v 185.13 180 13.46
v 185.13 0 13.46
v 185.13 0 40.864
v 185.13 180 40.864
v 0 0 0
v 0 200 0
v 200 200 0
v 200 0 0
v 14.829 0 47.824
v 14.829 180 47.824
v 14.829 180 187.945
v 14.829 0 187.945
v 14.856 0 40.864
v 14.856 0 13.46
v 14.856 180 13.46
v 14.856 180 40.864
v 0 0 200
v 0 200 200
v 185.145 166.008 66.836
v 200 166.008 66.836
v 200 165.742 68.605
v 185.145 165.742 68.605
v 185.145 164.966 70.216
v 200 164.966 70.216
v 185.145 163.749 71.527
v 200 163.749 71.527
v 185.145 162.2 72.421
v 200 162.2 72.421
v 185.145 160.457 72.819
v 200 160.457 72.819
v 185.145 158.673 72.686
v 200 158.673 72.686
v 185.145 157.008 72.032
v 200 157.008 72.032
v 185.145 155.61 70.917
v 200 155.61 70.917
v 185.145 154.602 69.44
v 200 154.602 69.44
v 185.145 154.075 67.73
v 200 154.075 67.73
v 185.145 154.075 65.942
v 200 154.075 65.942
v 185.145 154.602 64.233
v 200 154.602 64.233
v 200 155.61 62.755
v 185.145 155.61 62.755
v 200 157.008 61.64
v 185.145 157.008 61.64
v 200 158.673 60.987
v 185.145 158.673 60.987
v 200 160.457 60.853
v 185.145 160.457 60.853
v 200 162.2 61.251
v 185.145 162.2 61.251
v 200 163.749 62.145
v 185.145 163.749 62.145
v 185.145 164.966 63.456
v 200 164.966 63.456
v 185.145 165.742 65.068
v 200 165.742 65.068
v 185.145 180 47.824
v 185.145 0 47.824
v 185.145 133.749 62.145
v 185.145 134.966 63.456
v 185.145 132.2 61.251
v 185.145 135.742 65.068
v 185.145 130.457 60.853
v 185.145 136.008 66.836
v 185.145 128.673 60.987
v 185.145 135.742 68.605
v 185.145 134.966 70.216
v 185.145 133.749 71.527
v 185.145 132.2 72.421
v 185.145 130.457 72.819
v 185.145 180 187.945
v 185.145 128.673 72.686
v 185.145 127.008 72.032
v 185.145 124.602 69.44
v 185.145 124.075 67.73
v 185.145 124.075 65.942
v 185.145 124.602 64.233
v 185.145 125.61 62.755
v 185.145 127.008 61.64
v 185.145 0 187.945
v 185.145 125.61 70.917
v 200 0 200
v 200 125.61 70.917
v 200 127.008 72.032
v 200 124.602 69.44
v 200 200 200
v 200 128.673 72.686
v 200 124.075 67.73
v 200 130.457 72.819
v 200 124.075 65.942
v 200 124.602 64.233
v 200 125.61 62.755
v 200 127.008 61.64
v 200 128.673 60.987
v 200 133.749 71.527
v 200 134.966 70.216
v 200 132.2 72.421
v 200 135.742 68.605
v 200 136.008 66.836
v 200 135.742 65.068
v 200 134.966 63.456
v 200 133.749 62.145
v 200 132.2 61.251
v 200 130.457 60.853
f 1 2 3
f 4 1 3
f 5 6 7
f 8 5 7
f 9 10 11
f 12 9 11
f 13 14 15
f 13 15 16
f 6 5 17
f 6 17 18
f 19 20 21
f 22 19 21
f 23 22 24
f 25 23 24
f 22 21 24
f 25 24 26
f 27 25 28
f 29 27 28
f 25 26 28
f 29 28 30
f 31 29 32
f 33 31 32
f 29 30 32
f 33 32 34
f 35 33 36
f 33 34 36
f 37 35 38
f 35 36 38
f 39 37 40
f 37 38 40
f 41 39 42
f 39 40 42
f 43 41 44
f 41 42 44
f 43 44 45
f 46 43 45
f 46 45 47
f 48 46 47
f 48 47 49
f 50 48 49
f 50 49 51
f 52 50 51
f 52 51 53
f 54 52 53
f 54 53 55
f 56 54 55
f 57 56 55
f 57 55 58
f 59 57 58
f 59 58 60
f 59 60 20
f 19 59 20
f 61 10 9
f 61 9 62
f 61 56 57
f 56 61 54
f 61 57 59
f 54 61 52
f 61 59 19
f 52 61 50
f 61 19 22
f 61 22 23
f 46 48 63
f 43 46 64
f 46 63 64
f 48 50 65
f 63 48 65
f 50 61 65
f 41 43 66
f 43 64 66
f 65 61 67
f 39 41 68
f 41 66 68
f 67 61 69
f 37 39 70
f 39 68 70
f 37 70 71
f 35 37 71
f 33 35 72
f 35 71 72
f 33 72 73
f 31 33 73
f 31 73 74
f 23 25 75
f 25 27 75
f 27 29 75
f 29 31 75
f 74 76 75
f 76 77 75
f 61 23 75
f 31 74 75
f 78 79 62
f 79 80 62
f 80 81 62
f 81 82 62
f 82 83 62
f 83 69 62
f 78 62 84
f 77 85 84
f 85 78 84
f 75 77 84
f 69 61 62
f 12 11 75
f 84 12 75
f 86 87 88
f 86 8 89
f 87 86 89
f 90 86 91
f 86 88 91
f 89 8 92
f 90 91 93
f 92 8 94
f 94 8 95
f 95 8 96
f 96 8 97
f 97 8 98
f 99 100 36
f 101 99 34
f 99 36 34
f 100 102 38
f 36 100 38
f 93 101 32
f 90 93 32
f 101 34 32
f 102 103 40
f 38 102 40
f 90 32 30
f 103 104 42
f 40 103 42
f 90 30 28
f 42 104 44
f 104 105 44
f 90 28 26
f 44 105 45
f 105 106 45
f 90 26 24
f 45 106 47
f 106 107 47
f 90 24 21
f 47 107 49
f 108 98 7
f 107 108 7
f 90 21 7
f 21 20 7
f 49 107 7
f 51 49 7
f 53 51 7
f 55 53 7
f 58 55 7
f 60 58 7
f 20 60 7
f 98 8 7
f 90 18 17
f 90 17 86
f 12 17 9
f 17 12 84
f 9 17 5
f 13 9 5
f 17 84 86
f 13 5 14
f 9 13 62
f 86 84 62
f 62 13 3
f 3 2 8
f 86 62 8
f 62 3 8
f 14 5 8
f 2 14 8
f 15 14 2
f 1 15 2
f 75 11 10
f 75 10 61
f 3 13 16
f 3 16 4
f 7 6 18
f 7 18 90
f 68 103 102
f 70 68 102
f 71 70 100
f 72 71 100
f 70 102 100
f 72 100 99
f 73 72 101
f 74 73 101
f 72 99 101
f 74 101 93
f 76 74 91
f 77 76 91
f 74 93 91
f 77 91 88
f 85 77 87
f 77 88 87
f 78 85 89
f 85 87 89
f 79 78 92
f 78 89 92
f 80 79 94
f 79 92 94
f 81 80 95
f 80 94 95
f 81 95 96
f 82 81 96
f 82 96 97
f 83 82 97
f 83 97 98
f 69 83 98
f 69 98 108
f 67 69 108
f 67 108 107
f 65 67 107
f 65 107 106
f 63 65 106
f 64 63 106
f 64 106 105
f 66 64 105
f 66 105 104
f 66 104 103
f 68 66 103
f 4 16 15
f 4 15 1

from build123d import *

# Parameters (mm, degrees)
BOX_W           = 200
BOX_H           = 200
BOX_DEPTH       = 200
SKETCH_W        = 170.31563
SKETCH_H        = 140.120693
SKETCH_W_2      = 170.274007
SKETCH_H_2      = 27.404772
POCKET_DEPTH    = 180
SKETCH001_R     = 6
POCKET004_DEPTH = 20


with BuildPart() as part:
    # Box → Box (new body)
    with BuildSketch(Plane.XY):
        with Locations((100, 100)):
            Rectangle(BOX_W, BOX_H)
    extrude(amount=BOX_DEPTH)

    # Sketch → Pocket (cut)
    with BuildSketch(Plane.XZ):
        with Locations((99.987303, 117.884569)):
            Rectangle(SKETCH_W, SKETCH_H)
        with Locations((99.992803, 27.16207)):
            Rectangle(SKETCH_W_2, SKETCH_H_2)
    extrude(amount=-POCKET_DEPTH, mode=Mode.SUBTRACT)

    # Sketch001 → Pocket004 (cut)
    with BuildSketch(Plane.YZ.offset(200)):
        with Locations((130.008312, 66.836238)):
            Circle(SKETCH001_R)
        with Locations((160.008312, 66.836238)):
            Circle(SKETCH001_R)
    extrude(amount=-POCKET004_DEPTH, mode=Mode.SUBTRACT)


solid = part.part
